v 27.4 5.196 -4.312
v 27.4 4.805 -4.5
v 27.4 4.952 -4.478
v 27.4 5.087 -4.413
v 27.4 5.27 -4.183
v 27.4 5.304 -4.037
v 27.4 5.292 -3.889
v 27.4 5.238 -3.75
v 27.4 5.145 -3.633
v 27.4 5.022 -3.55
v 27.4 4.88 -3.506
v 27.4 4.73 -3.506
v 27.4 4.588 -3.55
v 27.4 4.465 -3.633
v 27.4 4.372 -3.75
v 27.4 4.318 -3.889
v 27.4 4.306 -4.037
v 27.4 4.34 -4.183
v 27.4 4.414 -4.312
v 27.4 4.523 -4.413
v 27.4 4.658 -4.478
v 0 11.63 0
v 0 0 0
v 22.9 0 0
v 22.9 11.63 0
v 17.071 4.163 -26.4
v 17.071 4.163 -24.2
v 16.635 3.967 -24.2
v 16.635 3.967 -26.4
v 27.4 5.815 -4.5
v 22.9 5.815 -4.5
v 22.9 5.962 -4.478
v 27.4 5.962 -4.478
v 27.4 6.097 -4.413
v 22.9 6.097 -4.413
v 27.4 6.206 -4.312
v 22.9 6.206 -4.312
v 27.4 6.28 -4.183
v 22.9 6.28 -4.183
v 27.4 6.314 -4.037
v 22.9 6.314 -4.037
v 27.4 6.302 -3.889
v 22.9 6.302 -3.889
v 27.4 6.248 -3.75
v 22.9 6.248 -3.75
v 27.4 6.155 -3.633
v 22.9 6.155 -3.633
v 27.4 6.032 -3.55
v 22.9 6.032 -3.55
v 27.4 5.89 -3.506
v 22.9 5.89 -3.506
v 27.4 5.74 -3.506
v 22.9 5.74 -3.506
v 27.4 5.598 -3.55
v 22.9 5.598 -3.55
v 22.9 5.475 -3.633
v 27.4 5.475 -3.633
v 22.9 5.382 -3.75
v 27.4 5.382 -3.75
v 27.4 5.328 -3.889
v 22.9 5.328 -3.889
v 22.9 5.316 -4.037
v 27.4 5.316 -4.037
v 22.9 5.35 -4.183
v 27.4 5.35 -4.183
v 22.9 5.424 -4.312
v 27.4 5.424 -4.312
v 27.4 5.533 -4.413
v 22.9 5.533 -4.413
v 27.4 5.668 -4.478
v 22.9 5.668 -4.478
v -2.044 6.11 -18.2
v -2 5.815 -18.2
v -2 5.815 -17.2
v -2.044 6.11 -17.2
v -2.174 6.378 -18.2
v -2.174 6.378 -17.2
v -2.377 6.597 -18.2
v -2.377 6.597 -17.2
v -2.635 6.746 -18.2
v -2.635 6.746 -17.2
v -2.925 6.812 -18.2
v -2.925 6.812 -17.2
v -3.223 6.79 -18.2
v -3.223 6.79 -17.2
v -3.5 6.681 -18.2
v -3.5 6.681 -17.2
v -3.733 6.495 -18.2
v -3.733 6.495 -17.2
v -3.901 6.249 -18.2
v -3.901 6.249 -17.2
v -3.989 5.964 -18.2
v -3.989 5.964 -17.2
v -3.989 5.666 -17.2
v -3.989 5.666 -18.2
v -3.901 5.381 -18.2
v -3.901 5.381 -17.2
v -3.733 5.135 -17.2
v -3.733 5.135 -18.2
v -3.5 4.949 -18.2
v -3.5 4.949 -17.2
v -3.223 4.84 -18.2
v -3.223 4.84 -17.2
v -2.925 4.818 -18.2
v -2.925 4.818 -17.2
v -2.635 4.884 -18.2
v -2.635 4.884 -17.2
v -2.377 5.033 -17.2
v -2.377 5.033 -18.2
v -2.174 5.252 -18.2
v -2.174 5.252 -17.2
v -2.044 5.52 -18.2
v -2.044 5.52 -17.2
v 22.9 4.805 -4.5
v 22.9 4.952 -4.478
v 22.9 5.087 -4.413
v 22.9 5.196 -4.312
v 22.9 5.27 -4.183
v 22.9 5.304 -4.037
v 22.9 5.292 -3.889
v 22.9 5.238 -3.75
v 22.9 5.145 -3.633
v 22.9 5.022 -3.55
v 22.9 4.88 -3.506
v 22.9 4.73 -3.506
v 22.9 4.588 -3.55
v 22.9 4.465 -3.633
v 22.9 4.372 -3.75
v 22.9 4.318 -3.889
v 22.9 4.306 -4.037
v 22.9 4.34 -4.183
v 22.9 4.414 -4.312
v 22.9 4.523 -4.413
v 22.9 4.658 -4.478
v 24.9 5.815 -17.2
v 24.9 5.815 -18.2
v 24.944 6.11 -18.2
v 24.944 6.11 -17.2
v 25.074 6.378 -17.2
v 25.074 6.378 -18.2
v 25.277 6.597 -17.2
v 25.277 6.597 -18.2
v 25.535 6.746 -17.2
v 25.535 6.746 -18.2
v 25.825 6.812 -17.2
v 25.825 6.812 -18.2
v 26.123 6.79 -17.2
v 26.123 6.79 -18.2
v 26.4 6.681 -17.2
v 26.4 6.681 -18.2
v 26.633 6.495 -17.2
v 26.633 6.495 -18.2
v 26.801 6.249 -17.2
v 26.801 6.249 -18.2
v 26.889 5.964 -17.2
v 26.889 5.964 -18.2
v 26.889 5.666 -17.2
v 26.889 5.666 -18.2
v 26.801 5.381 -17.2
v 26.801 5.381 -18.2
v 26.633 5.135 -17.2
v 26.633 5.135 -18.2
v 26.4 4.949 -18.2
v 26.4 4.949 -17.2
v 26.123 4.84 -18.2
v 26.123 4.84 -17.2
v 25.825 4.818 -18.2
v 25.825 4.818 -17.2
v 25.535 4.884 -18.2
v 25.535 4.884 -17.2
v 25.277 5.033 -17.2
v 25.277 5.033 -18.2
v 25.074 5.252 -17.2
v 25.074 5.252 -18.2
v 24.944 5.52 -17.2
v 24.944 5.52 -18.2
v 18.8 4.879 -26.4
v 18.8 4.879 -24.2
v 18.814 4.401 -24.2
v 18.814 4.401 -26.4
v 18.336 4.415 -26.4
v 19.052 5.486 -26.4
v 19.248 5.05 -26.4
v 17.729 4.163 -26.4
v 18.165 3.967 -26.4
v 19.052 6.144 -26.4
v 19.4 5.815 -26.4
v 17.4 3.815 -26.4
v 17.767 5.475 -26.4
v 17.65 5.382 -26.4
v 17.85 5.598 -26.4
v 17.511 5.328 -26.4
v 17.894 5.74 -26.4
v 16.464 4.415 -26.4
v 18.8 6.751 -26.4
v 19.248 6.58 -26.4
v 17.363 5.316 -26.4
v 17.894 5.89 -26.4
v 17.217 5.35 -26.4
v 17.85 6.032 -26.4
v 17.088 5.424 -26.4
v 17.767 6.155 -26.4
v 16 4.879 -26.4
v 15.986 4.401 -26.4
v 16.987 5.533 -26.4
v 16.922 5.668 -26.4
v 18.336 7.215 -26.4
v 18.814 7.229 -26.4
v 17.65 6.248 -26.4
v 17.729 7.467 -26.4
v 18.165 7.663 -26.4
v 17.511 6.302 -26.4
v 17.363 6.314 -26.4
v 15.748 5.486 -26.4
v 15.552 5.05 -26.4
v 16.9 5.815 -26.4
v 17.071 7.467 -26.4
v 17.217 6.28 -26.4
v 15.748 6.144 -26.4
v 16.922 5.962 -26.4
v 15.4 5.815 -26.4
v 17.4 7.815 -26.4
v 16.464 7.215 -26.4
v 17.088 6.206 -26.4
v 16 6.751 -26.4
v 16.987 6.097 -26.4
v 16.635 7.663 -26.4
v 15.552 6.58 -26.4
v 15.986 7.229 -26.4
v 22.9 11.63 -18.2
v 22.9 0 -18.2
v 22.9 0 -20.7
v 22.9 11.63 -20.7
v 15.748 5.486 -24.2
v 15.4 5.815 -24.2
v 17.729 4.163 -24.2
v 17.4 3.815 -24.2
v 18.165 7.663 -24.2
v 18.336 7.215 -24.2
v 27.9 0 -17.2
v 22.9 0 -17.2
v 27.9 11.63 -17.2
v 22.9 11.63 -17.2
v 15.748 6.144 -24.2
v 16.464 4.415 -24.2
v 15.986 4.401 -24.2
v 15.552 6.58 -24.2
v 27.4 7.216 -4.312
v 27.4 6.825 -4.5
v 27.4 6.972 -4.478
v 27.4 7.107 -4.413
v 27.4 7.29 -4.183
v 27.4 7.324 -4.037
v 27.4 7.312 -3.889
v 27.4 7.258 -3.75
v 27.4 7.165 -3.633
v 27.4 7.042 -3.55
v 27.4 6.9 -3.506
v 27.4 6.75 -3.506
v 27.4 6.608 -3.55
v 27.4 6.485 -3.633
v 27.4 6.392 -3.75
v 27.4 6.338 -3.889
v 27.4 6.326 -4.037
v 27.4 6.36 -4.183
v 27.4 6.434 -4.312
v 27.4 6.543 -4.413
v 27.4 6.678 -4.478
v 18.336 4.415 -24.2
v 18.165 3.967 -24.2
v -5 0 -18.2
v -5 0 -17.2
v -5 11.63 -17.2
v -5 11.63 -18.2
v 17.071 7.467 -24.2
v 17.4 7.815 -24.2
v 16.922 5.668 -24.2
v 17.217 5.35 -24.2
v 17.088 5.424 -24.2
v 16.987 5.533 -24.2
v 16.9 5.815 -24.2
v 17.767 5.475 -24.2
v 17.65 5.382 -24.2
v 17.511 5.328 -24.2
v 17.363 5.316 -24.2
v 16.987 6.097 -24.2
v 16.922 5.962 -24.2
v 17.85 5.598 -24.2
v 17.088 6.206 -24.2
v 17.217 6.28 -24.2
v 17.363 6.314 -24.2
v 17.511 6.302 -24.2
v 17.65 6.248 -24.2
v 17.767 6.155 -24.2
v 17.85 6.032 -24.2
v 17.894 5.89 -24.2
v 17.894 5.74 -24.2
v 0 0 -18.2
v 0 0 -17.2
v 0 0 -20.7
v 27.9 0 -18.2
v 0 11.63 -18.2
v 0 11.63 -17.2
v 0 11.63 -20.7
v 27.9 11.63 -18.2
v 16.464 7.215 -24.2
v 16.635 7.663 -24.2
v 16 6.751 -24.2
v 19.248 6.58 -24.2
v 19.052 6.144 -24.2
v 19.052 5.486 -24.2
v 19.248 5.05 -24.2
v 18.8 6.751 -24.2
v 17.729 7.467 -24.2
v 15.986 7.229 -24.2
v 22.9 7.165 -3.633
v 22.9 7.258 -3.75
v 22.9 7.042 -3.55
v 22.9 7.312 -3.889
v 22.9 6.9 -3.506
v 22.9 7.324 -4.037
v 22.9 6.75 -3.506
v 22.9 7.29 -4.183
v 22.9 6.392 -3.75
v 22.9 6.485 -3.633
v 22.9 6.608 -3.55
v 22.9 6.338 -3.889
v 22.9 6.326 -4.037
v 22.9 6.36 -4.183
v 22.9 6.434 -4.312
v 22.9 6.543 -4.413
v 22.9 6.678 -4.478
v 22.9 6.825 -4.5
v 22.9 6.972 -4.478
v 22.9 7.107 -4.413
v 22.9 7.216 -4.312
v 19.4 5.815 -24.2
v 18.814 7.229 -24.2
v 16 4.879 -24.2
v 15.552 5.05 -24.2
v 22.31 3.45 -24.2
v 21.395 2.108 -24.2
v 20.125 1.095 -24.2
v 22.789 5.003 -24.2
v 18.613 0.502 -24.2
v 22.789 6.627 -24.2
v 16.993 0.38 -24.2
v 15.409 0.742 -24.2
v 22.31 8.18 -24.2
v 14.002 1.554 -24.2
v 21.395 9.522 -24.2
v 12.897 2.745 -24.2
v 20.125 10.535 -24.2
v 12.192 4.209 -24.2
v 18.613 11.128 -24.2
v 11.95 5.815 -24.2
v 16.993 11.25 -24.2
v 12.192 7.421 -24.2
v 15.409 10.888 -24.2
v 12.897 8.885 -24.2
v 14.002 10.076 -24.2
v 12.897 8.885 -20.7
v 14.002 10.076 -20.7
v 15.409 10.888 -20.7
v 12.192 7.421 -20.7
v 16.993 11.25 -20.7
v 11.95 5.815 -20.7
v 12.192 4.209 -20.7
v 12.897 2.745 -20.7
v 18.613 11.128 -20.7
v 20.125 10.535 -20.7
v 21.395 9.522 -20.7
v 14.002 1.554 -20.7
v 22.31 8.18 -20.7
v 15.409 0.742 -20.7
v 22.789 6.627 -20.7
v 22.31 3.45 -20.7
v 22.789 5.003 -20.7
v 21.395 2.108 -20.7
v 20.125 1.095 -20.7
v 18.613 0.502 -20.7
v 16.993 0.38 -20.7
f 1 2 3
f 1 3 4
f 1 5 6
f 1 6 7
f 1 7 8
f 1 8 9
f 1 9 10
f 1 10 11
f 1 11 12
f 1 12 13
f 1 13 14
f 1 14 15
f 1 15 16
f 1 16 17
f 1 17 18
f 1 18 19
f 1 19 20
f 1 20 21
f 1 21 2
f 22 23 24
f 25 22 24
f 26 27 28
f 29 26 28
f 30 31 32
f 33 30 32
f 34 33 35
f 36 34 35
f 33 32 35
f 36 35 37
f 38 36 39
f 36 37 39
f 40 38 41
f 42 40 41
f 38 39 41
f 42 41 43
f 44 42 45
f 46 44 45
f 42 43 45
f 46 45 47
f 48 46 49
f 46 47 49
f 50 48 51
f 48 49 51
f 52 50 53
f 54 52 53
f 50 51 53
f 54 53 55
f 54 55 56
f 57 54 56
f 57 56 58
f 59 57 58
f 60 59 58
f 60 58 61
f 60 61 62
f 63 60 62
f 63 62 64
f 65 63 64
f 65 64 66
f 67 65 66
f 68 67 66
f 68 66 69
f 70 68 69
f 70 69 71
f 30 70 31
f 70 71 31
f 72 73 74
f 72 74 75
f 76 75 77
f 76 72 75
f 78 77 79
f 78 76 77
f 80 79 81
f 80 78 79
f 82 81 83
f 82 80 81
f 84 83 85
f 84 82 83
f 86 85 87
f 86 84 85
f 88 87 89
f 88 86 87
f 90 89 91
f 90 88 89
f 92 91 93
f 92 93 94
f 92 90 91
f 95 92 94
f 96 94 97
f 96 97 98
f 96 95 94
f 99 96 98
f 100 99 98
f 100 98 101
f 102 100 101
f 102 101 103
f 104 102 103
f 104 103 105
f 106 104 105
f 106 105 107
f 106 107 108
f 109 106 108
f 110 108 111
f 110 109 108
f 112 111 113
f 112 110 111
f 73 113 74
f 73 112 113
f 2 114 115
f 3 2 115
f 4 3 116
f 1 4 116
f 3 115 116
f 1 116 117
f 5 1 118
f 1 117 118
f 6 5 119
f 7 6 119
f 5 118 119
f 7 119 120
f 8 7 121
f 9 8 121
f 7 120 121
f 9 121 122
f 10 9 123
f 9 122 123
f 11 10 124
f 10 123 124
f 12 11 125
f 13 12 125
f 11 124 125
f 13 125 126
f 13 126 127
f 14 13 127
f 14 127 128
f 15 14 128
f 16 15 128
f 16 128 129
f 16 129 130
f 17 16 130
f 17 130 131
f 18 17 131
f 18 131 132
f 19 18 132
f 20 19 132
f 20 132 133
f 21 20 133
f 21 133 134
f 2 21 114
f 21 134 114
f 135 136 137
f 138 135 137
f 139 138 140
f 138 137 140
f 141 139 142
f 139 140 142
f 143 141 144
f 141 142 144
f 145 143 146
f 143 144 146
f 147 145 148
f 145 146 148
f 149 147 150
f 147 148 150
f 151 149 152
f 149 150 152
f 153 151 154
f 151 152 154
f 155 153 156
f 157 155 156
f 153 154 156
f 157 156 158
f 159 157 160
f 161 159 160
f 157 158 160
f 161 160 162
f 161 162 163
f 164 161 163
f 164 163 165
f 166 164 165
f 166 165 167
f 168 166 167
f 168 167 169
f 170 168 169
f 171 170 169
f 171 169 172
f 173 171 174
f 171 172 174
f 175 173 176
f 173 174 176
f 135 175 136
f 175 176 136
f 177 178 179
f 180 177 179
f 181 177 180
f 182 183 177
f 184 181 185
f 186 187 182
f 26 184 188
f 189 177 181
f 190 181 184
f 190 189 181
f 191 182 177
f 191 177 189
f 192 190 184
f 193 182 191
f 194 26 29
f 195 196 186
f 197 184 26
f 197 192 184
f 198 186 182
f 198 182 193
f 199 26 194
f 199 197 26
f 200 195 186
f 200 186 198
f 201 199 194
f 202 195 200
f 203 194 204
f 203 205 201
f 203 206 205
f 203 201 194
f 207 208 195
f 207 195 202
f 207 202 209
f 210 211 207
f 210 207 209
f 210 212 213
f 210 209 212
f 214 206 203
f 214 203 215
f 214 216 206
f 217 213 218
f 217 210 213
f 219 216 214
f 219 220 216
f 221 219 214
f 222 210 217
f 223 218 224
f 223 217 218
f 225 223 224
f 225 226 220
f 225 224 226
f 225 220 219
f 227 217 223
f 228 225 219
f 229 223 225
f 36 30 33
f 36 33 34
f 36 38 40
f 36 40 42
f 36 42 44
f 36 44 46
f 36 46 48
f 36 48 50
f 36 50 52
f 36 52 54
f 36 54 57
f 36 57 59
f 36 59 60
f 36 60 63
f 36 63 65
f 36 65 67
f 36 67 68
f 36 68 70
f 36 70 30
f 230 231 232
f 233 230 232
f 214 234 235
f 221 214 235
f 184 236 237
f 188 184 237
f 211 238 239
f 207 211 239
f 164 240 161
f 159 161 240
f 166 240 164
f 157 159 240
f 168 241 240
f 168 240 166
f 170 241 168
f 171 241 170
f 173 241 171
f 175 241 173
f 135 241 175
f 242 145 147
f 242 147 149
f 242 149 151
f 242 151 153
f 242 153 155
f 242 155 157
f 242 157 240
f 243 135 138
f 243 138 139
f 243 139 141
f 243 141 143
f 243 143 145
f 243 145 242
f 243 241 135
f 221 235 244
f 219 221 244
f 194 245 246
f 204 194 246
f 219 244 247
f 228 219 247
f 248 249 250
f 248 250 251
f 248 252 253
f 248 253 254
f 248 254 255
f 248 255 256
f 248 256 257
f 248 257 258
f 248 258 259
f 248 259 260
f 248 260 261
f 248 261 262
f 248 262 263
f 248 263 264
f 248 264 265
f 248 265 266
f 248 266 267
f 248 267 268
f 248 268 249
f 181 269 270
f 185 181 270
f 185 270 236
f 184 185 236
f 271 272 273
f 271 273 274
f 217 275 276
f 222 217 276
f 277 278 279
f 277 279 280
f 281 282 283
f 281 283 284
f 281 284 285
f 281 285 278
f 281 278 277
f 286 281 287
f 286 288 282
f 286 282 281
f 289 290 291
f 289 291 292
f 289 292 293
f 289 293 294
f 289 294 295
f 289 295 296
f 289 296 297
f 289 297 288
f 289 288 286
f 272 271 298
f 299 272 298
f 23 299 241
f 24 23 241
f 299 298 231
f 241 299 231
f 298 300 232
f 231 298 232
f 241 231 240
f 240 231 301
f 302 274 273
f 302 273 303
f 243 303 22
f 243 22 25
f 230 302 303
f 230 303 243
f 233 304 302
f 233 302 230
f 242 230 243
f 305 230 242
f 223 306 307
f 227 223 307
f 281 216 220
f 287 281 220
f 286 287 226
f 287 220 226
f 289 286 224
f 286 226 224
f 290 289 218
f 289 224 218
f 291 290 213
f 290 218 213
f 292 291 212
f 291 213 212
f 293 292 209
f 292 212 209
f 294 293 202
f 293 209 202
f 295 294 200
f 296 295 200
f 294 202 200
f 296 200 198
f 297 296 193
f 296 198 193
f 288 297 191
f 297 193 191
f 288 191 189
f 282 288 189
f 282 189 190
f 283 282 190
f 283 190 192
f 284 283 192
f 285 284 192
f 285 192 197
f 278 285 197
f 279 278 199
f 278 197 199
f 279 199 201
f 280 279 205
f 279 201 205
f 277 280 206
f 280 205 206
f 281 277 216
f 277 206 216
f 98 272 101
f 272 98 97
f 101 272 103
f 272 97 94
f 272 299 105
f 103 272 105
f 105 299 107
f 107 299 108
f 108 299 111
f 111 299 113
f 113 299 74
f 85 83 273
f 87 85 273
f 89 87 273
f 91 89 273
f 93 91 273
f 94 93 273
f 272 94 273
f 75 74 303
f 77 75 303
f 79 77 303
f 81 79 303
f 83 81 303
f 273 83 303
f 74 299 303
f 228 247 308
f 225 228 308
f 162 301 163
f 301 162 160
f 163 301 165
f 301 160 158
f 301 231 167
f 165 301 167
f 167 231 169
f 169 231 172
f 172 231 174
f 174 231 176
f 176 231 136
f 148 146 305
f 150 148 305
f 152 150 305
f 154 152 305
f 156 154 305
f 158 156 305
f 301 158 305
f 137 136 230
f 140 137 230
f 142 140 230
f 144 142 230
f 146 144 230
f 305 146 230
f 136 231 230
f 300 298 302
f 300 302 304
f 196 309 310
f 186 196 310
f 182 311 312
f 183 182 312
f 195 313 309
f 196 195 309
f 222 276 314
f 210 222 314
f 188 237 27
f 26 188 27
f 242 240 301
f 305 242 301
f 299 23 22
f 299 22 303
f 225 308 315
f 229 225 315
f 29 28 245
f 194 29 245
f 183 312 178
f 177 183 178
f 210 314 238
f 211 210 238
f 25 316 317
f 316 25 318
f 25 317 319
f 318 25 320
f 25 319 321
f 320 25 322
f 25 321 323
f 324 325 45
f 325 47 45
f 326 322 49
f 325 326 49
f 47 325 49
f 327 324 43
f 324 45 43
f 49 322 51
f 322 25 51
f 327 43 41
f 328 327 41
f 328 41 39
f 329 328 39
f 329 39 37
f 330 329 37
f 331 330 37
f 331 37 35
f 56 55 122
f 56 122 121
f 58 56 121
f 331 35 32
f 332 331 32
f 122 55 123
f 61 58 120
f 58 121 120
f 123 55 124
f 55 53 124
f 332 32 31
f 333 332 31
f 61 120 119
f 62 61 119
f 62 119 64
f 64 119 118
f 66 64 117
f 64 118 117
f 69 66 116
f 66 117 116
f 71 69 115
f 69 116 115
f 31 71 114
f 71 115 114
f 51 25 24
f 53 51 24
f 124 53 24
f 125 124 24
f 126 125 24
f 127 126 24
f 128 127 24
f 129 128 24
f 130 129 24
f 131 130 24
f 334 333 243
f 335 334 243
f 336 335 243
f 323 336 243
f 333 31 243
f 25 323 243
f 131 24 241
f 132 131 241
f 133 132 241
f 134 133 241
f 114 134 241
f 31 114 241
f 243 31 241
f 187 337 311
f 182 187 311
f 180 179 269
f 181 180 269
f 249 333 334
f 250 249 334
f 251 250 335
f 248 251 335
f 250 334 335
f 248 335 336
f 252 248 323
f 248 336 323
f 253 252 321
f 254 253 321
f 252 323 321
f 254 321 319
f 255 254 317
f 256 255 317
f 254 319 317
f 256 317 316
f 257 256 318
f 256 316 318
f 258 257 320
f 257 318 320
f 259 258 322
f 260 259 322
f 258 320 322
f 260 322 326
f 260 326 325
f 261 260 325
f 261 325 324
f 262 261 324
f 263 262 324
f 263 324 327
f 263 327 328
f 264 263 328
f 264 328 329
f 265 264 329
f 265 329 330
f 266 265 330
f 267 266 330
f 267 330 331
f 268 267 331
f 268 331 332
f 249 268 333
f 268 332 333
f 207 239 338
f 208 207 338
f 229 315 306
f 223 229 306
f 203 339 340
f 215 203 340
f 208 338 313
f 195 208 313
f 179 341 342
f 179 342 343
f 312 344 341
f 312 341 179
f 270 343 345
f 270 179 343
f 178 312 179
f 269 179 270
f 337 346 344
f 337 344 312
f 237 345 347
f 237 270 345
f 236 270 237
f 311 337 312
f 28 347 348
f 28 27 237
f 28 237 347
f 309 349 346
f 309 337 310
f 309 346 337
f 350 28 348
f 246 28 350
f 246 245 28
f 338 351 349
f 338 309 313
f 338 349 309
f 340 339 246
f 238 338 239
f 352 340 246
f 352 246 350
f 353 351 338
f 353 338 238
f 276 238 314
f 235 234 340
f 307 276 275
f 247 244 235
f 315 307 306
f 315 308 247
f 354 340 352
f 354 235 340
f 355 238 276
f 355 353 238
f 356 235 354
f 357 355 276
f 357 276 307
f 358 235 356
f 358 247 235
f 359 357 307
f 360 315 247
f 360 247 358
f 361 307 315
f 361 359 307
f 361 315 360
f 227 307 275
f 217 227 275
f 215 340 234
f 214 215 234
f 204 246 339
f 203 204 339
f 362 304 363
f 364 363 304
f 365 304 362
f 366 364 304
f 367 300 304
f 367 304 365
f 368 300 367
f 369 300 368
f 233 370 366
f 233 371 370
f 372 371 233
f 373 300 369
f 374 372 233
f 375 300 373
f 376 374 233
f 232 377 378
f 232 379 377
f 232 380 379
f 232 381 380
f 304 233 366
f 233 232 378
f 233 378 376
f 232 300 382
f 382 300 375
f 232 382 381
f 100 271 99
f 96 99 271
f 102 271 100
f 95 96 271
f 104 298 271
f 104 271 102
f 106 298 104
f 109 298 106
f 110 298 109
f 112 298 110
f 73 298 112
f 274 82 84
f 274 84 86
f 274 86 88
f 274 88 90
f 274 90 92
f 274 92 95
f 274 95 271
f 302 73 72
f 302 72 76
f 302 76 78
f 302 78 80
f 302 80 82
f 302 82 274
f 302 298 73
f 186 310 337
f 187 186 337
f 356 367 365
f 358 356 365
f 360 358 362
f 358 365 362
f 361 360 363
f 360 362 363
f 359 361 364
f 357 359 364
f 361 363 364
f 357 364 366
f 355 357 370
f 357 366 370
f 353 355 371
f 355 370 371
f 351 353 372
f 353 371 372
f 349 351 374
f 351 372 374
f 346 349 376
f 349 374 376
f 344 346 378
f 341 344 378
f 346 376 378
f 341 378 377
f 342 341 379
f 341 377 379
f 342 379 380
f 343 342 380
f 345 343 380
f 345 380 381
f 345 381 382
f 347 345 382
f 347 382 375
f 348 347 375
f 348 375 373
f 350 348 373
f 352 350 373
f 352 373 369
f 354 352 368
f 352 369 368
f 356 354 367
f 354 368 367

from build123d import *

# Parameters (mm, degrees)
SKETCH1_W            = 22.9
SKETCH1_H            = 20.7
BOSS_EXTRUDE1_DEPTH  = 11.63
SKETCH3_R            = 5.45
BOSS_EXTRUDE2_DEPTH  = 3.5
SKETCH4_W            = 1
SKETCH4_H            = 11.63
BOSS_EXTRUDE3_DEPTH  = 5
SKETCH5_R            = 1
CUT_EXTRUDE1_DEPTH   = 1
BOSS_EXTRUDE4_DEPTH  = 2.2
SKETCH8_R            = 0.5
BOSS_EXTRUDE6_DEPTH  = 4.5
SKETCH10_R           = 0.5
BOSS_EXTRUDE9_DEPTH  = 4.5
SKETCH9_R            = 0.5
BOSS_EXTRUDE10_DEPTH = 4.5
SKETCH13_R           = 0.5
CUT_EXTRUDE2_DEPTH   = 2.2


with BuildPart() as part:
    # Sketch1 → Boss-Extrude1 (new body)
    with BuildSketch(Plane(origin=(0, 0, 0), x_dir=(1, 0, 0), z_dir=(0, 1, 0))):
        with Locations((11.45, 10.35)):
            Rectangle(SKETCH1_W, SKETCH1_H)
    extrude(amount=BOSS_EXTRUDE1_DEPTH)

    # Sketch3 → Boss-Extrude2 (add)
    with BuildSketch(Plane(origin=(0, 0, -20.7), x_dir=(-1, 0, 0), z_dir=(0, 0, -1))):
        with Locations((-17.4, 5.815)):
            Circle(SKETCH3_R)
    extrude(amount=BOSS_EXTRUDE2_DEPTH)

    # Sketch4 → Boss-Extrude3 (add)
    with BuildSketch(Plane(origin=(22.9, 0, 0), x_dir=(0, 0, -1), z_dir=(1, 0, 0))):
        with Locations((17.7, 5.815)):
            Rectangle(SKETCH4_W, SKETCH4_H)
    boss_extrude3 = extrude(amount=BOSS_EXTRUDE3_DEPTH)

    # Sketch5 → Cut-Extrude1 (cut)
    with BuildSketch(Plane(origin=(0, 0, -18.2), x_dir=(-1, 0, 0), z_dir=(0, 0, -1))):
        with Locations((-25.9, 5.815)):
            Circle(SKETCH5_R)
    cut_extrude1 = extrude(amount=-CUT_EXTRUDE1_DEPTH, mode=Mode.SUBTRACT)

    # Mirror1: Boss-Extrude3, Cut-Extrude1 across plane
    add(boss_extrude3.mirror(Plane.ZY.offset(-11.45)))
    add(cut_extrude1.mirror(Plane.ZY.offset(-11.45)), mode=Mode.SUBTRACT)

    # Sketch6 → Boss-Extrude4 (add)
    with BuildSketch(Plane(origin=(0, 0, -24.2), x_dir=(-1, 0, 0), z_dir=(0, 0, -1))):
        Polygon((-17.4, 7.815), (-17.728528158, 7.466622583), (-18.165366865, 7.662759065), (-18.33556904, 7.215178017), (-18.814213562, 7.229213562), (-18.800178017, 6.75056904), (-19.247759065, 6.580366865), (-19.051622583, 6.143528158), (-19.4, 5.815), (-19.051622583, 5.486471842), (-19.247759065, 5.049633135), (-18.800178017, 4.87943096), (-18.814213562, 4.400786438), (-18.33556904, 4.414821983), (-18.165366865, 3.967240935), (-17.728528158, 4.163377417), (-17.4, 3.815), (-17.071471842, 4.163377417), (-16.634633135, 3.967240935), (-16.46443096, 4.414821983), (-15.985786438, 4.400786438), (-15.999821983, 4.87943096), (-15.552240935, 5.049633135), (-15.748377417, 5.486471842), (-15.4, 5.815), (-15.748377417, 6.143528158), (-15.552240935, 6.580366865), (-15.999821983, 6.75056904), (-15.985786438, 7.229213562), (-16.46443096, 7.215178017), (-16.634633135, 7.662759065), (-17.071471842, 7.466622583), align=None)
    extrude(amount=BOSS_EXTRUDE4_DEPTH)

    # Sketch8 → Boss-Extrude6 (add)
    with BuildSketch(Plane(origin=(22.9, 0, 0), x_dir=(0, 0, -1), z_dir=(1, 0, 0))):
        with Locations((4, 5.815)):
            Circle(SKETCH8_R)
    extrude(amount=BOSS_EXTRUDE6_DEPTH)

    # Sketch10 → Boss-Extrude9 (add)
    with BuildSketch(Plane(origin=(22.9, 0, 0), x_dir=(0, 0, -1), z_dir=(1, 0, 0))):
        with Locations((4, 4.805)):
            Circle(SKETCH10_R)
    extrude(amount=BOSS_EXTRUDE9_DEPTH)

    # Sketch9 → Boss-Extrude10 (add)
    with BuildSketch(Plane(origin=(22.9, 0, 0), x_dir=(0, 0, -1), z_dir=(1, 0, 0))):
        with Locations((4, 6.825)):
            Circle(SKETCH9_R)
    extrude(amount=BOSS_EXTRUDE10_DEPTH)

    # Sketch13 → Cut-Extrude2 (cut)
    with BuildSketch(Plane(origin=(0, 0, -26.4), x_dir=(-1, 0, 0), z_dir=(0, 0, -1))):
        with Locations((-17.4, 5.815)):
            Circle(SKETCH13_R)
    extrude(amount=-CUT_EXTRUDE2_DEPTH, mode=Mode.SUBTRACT)


solid = part.part
